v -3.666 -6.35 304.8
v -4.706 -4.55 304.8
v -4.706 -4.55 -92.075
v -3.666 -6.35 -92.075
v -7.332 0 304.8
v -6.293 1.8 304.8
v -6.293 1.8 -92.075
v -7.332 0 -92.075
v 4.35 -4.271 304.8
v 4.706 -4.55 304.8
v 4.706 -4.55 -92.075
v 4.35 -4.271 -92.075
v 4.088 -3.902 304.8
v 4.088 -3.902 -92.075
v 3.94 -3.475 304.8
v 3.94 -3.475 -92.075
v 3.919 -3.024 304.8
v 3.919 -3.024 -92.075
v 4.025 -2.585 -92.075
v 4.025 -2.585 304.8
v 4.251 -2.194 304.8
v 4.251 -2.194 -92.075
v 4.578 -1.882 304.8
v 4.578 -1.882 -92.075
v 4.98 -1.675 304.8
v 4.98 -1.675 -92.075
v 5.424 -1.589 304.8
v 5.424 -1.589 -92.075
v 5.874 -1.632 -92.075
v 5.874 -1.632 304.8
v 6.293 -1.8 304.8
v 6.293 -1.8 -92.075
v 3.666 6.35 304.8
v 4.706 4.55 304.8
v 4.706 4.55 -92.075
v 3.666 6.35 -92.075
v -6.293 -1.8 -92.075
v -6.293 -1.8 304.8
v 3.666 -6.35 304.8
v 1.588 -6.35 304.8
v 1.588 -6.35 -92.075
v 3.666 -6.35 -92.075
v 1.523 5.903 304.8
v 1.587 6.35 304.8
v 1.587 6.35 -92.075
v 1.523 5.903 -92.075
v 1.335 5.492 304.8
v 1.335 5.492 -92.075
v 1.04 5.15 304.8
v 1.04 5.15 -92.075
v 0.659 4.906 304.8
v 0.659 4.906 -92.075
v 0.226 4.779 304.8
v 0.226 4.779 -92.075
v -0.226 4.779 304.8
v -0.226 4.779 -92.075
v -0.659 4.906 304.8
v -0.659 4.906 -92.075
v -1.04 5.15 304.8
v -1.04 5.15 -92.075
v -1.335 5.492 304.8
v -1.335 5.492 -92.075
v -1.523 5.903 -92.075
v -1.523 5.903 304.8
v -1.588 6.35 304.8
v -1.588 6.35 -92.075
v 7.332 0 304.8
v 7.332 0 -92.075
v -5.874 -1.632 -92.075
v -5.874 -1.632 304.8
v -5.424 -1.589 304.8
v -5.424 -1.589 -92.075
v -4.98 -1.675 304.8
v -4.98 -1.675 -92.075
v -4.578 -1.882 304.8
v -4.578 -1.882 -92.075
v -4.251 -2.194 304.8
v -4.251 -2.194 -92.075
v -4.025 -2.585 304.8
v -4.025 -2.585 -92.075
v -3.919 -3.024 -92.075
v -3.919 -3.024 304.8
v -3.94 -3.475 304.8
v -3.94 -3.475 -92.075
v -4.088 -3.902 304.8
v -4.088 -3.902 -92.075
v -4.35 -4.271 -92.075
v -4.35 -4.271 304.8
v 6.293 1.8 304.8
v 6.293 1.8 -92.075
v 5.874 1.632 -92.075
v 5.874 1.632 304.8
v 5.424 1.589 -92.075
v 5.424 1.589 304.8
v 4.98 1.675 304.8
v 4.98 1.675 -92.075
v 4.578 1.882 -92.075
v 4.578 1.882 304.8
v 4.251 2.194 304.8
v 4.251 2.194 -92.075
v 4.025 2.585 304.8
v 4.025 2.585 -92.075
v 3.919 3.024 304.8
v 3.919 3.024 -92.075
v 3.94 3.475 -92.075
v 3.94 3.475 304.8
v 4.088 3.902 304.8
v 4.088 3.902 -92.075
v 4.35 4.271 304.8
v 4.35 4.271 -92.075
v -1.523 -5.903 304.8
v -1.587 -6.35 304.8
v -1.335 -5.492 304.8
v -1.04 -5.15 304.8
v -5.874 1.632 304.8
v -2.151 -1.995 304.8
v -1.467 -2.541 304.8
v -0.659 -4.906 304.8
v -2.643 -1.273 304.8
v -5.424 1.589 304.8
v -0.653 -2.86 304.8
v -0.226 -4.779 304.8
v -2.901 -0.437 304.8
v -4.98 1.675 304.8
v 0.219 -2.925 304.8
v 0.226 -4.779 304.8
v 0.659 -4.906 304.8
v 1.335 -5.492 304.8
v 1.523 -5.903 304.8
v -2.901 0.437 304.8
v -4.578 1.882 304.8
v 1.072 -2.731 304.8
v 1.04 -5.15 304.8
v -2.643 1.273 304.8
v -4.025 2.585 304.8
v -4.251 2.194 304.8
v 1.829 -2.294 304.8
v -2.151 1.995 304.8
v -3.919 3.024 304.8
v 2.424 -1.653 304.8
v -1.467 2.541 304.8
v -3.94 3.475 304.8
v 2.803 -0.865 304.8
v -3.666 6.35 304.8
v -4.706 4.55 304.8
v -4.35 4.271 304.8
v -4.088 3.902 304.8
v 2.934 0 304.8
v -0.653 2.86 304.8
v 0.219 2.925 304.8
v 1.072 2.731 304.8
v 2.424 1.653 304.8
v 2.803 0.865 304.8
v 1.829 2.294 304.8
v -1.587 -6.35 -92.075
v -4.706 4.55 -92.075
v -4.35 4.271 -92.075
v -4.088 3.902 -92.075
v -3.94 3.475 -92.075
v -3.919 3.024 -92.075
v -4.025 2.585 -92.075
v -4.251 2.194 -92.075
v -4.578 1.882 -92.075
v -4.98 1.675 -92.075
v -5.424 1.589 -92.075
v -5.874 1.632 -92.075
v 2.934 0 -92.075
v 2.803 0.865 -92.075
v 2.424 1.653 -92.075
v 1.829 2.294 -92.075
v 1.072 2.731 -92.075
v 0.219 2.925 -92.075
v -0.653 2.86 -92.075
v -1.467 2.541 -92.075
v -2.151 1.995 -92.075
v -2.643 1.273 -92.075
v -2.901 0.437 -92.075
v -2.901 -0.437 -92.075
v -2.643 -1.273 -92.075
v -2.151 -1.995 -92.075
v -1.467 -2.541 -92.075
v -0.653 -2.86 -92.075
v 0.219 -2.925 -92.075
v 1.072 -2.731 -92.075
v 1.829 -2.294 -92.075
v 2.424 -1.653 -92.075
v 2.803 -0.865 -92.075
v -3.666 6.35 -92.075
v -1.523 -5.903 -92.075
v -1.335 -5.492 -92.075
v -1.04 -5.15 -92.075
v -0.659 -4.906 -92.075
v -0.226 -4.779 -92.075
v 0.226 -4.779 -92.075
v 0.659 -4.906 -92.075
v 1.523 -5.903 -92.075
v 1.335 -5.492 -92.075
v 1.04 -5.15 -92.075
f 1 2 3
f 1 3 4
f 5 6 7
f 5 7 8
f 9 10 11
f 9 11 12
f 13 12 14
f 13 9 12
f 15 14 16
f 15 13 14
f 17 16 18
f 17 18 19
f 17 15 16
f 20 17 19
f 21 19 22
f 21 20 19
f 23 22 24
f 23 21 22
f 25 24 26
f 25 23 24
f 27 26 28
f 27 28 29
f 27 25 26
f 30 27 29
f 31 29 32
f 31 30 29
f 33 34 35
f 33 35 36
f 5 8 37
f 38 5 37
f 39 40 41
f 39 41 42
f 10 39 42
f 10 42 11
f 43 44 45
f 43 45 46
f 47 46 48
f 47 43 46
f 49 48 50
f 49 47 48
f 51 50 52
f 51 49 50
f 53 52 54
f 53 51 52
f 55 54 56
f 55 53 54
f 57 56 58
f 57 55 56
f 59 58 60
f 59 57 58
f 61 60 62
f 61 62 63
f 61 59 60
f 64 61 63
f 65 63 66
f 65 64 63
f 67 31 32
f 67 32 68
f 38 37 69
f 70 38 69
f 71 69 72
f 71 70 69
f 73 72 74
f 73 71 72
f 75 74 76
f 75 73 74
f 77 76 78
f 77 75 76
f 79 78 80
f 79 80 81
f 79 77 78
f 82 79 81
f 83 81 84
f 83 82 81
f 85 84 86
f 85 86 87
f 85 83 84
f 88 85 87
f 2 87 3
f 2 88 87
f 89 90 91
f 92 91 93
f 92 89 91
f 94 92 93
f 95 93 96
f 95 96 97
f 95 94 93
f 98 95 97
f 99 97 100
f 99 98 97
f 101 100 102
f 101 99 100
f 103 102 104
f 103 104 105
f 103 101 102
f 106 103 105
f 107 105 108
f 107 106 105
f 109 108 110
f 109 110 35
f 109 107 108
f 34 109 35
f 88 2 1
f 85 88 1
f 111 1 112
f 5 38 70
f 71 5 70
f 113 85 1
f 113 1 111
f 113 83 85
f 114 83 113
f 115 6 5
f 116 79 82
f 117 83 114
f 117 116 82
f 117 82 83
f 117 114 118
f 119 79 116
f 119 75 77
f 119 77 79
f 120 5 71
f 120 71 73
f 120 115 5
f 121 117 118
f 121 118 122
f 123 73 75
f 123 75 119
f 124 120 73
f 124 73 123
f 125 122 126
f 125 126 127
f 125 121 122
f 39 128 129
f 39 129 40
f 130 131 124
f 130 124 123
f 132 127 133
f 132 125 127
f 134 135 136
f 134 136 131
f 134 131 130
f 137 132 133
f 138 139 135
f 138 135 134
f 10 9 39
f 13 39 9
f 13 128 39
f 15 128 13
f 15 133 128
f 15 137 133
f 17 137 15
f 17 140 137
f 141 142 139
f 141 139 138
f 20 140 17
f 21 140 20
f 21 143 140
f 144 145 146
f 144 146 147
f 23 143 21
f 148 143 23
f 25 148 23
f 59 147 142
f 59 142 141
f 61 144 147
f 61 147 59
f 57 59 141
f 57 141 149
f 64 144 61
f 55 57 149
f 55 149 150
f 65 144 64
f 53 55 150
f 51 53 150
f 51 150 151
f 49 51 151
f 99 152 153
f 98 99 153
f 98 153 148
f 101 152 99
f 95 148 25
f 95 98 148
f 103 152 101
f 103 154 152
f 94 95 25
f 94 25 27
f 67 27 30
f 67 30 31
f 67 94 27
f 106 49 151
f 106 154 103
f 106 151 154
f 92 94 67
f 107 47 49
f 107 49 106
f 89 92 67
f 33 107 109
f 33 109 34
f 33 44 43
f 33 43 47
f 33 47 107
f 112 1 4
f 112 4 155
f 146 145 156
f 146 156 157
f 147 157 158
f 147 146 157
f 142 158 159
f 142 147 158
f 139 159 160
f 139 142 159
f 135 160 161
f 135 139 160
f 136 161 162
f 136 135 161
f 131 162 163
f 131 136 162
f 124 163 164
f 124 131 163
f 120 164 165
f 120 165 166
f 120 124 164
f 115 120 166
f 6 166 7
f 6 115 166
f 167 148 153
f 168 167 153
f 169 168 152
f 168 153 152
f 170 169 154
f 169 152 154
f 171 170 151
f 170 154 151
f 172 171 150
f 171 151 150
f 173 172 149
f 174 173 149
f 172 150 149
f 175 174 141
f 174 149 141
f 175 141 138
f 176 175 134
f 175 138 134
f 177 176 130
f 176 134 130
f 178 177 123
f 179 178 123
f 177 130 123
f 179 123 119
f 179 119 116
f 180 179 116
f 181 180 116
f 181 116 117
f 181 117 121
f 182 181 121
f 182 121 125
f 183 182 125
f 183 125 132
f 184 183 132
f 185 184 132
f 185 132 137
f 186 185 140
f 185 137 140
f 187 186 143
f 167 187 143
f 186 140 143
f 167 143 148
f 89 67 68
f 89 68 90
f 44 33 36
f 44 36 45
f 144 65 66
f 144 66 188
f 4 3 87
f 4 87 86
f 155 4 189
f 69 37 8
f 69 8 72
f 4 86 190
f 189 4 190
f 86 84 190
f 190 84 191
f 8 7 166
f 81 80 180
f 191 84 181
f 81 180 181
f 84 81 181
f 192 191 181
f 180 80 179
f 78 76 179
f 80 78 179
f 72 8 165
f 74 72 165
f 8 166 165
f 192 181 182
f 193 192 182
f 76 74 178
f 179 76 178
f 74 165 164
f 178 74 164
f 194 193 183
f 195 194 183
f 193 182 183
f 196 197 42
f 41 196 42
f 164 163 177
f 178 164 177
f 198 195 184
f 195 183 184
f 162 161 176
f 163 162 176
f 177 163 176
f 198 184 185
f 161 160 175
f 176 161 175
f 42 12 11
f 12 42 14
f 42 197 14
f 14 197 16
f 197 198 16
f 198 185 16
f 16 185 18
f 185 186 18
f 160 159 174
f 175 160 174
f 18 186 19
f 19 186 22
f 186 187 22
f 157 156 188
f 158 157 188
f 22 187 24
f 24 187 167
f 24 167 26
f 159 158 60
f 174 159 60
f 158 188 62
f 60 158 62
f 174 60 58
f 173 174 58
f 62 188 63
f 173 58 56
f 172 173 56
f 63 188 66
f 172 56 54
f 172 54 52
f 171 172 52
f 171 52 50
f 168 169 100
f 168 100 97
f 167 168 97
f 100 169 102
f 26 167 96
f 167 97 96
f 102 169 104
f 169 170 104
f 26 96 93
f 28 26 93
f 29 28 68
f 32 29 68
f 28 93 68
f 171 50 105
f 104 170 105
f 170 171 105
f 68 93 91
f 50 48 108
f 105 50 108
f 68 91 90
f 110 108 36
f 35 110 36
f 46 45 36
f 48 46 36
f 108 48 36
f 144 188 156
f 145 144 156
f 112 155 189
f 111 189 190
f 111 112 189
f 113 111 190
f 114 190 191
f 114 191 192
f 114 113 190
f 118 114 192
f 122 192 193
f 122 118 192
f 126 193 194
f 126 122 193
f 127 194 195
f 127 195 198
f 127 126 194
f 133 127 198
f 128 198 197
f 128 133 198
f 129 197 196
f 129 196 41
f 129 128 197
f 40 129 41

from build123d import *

# Parameters (mm, degrees)
SKETCH1_R           = 2.9337
BOSS_EXTRUDE1_DEPTH = 396.875


with BuildPart() as part:
    # Sketch1 → Boss-Extrude1 (new body)
    with BuildSketch(Plane.XY.offset(304.8)):
        with BuildLine():
            Line((6.293011699, -1.800184894), (7.332348803, -2.22e-07))
            Line((7.332348803, -2.22e-07), (6.293011439, 1.800184522))
            ThreePointArc((6.293011439, 1.800184522), (4.124446058, 2.381249653), (4.705511189, 4.549815034))
            Line((4.705511189, 4.549815034), (3.666173825, 6.349999778))
            Line((3.666173825, 6.349999778), (1.587499615, 6.349999778))
            ThreePointArc((1.587499615, 6.349999778), (-3.85e-07, 4.762499778), (-1.587500385, 6.349999778))
            Line((-1.587500385, 6.349999778), (-3.666174594, 6.349999778))
            Line((-3.666174594, 6.349999778), (-4.70551159, 4.549815043))
            ThreePointArc((-4.70551159, 4.549815043), (-4.12444613, 2.38124975), (-6.293011423, 1.80018429))
            Line((-6.293011423, 1.80018429), (-7.332348419, -4.44e-07))
            Line((-7.332348419, -4.44e-07), (-6.293011205, -1.800185053))
            ThreePointArc((-6.293011205, -1.800185053), (-4.124445841, -2.38125025), (-4.705511038, -4.549815614))
            Line((-4.705511038, -4.549815614), (-3.666173825, -6.350000222))
            Line((-3.666173825, -6.350000222), (-1.587499615, -6.350000222))
            ThreePointArc((-1.587499615, -6.350000222), (3.85e-07, -4.762500222), (1.587500385, -6.350000222))
            Line((1.587500385, -6.350000222), (3.666174594, -6.350000222))
            Line((3.666174594, -6.350000222), (4.705511699, -4.549815551))
            ThreePointArc((4.705511699, -4.549815551), (4.12444637, -2.381250222), (6.293011699, -1.800184894))
        make_face()
        Circle(SKETCH1_R, mode=Mode.SUBTRACT)
    extrude(amount=-BOSS_EXTRUDE1_DEPTH)


solid = part.part
